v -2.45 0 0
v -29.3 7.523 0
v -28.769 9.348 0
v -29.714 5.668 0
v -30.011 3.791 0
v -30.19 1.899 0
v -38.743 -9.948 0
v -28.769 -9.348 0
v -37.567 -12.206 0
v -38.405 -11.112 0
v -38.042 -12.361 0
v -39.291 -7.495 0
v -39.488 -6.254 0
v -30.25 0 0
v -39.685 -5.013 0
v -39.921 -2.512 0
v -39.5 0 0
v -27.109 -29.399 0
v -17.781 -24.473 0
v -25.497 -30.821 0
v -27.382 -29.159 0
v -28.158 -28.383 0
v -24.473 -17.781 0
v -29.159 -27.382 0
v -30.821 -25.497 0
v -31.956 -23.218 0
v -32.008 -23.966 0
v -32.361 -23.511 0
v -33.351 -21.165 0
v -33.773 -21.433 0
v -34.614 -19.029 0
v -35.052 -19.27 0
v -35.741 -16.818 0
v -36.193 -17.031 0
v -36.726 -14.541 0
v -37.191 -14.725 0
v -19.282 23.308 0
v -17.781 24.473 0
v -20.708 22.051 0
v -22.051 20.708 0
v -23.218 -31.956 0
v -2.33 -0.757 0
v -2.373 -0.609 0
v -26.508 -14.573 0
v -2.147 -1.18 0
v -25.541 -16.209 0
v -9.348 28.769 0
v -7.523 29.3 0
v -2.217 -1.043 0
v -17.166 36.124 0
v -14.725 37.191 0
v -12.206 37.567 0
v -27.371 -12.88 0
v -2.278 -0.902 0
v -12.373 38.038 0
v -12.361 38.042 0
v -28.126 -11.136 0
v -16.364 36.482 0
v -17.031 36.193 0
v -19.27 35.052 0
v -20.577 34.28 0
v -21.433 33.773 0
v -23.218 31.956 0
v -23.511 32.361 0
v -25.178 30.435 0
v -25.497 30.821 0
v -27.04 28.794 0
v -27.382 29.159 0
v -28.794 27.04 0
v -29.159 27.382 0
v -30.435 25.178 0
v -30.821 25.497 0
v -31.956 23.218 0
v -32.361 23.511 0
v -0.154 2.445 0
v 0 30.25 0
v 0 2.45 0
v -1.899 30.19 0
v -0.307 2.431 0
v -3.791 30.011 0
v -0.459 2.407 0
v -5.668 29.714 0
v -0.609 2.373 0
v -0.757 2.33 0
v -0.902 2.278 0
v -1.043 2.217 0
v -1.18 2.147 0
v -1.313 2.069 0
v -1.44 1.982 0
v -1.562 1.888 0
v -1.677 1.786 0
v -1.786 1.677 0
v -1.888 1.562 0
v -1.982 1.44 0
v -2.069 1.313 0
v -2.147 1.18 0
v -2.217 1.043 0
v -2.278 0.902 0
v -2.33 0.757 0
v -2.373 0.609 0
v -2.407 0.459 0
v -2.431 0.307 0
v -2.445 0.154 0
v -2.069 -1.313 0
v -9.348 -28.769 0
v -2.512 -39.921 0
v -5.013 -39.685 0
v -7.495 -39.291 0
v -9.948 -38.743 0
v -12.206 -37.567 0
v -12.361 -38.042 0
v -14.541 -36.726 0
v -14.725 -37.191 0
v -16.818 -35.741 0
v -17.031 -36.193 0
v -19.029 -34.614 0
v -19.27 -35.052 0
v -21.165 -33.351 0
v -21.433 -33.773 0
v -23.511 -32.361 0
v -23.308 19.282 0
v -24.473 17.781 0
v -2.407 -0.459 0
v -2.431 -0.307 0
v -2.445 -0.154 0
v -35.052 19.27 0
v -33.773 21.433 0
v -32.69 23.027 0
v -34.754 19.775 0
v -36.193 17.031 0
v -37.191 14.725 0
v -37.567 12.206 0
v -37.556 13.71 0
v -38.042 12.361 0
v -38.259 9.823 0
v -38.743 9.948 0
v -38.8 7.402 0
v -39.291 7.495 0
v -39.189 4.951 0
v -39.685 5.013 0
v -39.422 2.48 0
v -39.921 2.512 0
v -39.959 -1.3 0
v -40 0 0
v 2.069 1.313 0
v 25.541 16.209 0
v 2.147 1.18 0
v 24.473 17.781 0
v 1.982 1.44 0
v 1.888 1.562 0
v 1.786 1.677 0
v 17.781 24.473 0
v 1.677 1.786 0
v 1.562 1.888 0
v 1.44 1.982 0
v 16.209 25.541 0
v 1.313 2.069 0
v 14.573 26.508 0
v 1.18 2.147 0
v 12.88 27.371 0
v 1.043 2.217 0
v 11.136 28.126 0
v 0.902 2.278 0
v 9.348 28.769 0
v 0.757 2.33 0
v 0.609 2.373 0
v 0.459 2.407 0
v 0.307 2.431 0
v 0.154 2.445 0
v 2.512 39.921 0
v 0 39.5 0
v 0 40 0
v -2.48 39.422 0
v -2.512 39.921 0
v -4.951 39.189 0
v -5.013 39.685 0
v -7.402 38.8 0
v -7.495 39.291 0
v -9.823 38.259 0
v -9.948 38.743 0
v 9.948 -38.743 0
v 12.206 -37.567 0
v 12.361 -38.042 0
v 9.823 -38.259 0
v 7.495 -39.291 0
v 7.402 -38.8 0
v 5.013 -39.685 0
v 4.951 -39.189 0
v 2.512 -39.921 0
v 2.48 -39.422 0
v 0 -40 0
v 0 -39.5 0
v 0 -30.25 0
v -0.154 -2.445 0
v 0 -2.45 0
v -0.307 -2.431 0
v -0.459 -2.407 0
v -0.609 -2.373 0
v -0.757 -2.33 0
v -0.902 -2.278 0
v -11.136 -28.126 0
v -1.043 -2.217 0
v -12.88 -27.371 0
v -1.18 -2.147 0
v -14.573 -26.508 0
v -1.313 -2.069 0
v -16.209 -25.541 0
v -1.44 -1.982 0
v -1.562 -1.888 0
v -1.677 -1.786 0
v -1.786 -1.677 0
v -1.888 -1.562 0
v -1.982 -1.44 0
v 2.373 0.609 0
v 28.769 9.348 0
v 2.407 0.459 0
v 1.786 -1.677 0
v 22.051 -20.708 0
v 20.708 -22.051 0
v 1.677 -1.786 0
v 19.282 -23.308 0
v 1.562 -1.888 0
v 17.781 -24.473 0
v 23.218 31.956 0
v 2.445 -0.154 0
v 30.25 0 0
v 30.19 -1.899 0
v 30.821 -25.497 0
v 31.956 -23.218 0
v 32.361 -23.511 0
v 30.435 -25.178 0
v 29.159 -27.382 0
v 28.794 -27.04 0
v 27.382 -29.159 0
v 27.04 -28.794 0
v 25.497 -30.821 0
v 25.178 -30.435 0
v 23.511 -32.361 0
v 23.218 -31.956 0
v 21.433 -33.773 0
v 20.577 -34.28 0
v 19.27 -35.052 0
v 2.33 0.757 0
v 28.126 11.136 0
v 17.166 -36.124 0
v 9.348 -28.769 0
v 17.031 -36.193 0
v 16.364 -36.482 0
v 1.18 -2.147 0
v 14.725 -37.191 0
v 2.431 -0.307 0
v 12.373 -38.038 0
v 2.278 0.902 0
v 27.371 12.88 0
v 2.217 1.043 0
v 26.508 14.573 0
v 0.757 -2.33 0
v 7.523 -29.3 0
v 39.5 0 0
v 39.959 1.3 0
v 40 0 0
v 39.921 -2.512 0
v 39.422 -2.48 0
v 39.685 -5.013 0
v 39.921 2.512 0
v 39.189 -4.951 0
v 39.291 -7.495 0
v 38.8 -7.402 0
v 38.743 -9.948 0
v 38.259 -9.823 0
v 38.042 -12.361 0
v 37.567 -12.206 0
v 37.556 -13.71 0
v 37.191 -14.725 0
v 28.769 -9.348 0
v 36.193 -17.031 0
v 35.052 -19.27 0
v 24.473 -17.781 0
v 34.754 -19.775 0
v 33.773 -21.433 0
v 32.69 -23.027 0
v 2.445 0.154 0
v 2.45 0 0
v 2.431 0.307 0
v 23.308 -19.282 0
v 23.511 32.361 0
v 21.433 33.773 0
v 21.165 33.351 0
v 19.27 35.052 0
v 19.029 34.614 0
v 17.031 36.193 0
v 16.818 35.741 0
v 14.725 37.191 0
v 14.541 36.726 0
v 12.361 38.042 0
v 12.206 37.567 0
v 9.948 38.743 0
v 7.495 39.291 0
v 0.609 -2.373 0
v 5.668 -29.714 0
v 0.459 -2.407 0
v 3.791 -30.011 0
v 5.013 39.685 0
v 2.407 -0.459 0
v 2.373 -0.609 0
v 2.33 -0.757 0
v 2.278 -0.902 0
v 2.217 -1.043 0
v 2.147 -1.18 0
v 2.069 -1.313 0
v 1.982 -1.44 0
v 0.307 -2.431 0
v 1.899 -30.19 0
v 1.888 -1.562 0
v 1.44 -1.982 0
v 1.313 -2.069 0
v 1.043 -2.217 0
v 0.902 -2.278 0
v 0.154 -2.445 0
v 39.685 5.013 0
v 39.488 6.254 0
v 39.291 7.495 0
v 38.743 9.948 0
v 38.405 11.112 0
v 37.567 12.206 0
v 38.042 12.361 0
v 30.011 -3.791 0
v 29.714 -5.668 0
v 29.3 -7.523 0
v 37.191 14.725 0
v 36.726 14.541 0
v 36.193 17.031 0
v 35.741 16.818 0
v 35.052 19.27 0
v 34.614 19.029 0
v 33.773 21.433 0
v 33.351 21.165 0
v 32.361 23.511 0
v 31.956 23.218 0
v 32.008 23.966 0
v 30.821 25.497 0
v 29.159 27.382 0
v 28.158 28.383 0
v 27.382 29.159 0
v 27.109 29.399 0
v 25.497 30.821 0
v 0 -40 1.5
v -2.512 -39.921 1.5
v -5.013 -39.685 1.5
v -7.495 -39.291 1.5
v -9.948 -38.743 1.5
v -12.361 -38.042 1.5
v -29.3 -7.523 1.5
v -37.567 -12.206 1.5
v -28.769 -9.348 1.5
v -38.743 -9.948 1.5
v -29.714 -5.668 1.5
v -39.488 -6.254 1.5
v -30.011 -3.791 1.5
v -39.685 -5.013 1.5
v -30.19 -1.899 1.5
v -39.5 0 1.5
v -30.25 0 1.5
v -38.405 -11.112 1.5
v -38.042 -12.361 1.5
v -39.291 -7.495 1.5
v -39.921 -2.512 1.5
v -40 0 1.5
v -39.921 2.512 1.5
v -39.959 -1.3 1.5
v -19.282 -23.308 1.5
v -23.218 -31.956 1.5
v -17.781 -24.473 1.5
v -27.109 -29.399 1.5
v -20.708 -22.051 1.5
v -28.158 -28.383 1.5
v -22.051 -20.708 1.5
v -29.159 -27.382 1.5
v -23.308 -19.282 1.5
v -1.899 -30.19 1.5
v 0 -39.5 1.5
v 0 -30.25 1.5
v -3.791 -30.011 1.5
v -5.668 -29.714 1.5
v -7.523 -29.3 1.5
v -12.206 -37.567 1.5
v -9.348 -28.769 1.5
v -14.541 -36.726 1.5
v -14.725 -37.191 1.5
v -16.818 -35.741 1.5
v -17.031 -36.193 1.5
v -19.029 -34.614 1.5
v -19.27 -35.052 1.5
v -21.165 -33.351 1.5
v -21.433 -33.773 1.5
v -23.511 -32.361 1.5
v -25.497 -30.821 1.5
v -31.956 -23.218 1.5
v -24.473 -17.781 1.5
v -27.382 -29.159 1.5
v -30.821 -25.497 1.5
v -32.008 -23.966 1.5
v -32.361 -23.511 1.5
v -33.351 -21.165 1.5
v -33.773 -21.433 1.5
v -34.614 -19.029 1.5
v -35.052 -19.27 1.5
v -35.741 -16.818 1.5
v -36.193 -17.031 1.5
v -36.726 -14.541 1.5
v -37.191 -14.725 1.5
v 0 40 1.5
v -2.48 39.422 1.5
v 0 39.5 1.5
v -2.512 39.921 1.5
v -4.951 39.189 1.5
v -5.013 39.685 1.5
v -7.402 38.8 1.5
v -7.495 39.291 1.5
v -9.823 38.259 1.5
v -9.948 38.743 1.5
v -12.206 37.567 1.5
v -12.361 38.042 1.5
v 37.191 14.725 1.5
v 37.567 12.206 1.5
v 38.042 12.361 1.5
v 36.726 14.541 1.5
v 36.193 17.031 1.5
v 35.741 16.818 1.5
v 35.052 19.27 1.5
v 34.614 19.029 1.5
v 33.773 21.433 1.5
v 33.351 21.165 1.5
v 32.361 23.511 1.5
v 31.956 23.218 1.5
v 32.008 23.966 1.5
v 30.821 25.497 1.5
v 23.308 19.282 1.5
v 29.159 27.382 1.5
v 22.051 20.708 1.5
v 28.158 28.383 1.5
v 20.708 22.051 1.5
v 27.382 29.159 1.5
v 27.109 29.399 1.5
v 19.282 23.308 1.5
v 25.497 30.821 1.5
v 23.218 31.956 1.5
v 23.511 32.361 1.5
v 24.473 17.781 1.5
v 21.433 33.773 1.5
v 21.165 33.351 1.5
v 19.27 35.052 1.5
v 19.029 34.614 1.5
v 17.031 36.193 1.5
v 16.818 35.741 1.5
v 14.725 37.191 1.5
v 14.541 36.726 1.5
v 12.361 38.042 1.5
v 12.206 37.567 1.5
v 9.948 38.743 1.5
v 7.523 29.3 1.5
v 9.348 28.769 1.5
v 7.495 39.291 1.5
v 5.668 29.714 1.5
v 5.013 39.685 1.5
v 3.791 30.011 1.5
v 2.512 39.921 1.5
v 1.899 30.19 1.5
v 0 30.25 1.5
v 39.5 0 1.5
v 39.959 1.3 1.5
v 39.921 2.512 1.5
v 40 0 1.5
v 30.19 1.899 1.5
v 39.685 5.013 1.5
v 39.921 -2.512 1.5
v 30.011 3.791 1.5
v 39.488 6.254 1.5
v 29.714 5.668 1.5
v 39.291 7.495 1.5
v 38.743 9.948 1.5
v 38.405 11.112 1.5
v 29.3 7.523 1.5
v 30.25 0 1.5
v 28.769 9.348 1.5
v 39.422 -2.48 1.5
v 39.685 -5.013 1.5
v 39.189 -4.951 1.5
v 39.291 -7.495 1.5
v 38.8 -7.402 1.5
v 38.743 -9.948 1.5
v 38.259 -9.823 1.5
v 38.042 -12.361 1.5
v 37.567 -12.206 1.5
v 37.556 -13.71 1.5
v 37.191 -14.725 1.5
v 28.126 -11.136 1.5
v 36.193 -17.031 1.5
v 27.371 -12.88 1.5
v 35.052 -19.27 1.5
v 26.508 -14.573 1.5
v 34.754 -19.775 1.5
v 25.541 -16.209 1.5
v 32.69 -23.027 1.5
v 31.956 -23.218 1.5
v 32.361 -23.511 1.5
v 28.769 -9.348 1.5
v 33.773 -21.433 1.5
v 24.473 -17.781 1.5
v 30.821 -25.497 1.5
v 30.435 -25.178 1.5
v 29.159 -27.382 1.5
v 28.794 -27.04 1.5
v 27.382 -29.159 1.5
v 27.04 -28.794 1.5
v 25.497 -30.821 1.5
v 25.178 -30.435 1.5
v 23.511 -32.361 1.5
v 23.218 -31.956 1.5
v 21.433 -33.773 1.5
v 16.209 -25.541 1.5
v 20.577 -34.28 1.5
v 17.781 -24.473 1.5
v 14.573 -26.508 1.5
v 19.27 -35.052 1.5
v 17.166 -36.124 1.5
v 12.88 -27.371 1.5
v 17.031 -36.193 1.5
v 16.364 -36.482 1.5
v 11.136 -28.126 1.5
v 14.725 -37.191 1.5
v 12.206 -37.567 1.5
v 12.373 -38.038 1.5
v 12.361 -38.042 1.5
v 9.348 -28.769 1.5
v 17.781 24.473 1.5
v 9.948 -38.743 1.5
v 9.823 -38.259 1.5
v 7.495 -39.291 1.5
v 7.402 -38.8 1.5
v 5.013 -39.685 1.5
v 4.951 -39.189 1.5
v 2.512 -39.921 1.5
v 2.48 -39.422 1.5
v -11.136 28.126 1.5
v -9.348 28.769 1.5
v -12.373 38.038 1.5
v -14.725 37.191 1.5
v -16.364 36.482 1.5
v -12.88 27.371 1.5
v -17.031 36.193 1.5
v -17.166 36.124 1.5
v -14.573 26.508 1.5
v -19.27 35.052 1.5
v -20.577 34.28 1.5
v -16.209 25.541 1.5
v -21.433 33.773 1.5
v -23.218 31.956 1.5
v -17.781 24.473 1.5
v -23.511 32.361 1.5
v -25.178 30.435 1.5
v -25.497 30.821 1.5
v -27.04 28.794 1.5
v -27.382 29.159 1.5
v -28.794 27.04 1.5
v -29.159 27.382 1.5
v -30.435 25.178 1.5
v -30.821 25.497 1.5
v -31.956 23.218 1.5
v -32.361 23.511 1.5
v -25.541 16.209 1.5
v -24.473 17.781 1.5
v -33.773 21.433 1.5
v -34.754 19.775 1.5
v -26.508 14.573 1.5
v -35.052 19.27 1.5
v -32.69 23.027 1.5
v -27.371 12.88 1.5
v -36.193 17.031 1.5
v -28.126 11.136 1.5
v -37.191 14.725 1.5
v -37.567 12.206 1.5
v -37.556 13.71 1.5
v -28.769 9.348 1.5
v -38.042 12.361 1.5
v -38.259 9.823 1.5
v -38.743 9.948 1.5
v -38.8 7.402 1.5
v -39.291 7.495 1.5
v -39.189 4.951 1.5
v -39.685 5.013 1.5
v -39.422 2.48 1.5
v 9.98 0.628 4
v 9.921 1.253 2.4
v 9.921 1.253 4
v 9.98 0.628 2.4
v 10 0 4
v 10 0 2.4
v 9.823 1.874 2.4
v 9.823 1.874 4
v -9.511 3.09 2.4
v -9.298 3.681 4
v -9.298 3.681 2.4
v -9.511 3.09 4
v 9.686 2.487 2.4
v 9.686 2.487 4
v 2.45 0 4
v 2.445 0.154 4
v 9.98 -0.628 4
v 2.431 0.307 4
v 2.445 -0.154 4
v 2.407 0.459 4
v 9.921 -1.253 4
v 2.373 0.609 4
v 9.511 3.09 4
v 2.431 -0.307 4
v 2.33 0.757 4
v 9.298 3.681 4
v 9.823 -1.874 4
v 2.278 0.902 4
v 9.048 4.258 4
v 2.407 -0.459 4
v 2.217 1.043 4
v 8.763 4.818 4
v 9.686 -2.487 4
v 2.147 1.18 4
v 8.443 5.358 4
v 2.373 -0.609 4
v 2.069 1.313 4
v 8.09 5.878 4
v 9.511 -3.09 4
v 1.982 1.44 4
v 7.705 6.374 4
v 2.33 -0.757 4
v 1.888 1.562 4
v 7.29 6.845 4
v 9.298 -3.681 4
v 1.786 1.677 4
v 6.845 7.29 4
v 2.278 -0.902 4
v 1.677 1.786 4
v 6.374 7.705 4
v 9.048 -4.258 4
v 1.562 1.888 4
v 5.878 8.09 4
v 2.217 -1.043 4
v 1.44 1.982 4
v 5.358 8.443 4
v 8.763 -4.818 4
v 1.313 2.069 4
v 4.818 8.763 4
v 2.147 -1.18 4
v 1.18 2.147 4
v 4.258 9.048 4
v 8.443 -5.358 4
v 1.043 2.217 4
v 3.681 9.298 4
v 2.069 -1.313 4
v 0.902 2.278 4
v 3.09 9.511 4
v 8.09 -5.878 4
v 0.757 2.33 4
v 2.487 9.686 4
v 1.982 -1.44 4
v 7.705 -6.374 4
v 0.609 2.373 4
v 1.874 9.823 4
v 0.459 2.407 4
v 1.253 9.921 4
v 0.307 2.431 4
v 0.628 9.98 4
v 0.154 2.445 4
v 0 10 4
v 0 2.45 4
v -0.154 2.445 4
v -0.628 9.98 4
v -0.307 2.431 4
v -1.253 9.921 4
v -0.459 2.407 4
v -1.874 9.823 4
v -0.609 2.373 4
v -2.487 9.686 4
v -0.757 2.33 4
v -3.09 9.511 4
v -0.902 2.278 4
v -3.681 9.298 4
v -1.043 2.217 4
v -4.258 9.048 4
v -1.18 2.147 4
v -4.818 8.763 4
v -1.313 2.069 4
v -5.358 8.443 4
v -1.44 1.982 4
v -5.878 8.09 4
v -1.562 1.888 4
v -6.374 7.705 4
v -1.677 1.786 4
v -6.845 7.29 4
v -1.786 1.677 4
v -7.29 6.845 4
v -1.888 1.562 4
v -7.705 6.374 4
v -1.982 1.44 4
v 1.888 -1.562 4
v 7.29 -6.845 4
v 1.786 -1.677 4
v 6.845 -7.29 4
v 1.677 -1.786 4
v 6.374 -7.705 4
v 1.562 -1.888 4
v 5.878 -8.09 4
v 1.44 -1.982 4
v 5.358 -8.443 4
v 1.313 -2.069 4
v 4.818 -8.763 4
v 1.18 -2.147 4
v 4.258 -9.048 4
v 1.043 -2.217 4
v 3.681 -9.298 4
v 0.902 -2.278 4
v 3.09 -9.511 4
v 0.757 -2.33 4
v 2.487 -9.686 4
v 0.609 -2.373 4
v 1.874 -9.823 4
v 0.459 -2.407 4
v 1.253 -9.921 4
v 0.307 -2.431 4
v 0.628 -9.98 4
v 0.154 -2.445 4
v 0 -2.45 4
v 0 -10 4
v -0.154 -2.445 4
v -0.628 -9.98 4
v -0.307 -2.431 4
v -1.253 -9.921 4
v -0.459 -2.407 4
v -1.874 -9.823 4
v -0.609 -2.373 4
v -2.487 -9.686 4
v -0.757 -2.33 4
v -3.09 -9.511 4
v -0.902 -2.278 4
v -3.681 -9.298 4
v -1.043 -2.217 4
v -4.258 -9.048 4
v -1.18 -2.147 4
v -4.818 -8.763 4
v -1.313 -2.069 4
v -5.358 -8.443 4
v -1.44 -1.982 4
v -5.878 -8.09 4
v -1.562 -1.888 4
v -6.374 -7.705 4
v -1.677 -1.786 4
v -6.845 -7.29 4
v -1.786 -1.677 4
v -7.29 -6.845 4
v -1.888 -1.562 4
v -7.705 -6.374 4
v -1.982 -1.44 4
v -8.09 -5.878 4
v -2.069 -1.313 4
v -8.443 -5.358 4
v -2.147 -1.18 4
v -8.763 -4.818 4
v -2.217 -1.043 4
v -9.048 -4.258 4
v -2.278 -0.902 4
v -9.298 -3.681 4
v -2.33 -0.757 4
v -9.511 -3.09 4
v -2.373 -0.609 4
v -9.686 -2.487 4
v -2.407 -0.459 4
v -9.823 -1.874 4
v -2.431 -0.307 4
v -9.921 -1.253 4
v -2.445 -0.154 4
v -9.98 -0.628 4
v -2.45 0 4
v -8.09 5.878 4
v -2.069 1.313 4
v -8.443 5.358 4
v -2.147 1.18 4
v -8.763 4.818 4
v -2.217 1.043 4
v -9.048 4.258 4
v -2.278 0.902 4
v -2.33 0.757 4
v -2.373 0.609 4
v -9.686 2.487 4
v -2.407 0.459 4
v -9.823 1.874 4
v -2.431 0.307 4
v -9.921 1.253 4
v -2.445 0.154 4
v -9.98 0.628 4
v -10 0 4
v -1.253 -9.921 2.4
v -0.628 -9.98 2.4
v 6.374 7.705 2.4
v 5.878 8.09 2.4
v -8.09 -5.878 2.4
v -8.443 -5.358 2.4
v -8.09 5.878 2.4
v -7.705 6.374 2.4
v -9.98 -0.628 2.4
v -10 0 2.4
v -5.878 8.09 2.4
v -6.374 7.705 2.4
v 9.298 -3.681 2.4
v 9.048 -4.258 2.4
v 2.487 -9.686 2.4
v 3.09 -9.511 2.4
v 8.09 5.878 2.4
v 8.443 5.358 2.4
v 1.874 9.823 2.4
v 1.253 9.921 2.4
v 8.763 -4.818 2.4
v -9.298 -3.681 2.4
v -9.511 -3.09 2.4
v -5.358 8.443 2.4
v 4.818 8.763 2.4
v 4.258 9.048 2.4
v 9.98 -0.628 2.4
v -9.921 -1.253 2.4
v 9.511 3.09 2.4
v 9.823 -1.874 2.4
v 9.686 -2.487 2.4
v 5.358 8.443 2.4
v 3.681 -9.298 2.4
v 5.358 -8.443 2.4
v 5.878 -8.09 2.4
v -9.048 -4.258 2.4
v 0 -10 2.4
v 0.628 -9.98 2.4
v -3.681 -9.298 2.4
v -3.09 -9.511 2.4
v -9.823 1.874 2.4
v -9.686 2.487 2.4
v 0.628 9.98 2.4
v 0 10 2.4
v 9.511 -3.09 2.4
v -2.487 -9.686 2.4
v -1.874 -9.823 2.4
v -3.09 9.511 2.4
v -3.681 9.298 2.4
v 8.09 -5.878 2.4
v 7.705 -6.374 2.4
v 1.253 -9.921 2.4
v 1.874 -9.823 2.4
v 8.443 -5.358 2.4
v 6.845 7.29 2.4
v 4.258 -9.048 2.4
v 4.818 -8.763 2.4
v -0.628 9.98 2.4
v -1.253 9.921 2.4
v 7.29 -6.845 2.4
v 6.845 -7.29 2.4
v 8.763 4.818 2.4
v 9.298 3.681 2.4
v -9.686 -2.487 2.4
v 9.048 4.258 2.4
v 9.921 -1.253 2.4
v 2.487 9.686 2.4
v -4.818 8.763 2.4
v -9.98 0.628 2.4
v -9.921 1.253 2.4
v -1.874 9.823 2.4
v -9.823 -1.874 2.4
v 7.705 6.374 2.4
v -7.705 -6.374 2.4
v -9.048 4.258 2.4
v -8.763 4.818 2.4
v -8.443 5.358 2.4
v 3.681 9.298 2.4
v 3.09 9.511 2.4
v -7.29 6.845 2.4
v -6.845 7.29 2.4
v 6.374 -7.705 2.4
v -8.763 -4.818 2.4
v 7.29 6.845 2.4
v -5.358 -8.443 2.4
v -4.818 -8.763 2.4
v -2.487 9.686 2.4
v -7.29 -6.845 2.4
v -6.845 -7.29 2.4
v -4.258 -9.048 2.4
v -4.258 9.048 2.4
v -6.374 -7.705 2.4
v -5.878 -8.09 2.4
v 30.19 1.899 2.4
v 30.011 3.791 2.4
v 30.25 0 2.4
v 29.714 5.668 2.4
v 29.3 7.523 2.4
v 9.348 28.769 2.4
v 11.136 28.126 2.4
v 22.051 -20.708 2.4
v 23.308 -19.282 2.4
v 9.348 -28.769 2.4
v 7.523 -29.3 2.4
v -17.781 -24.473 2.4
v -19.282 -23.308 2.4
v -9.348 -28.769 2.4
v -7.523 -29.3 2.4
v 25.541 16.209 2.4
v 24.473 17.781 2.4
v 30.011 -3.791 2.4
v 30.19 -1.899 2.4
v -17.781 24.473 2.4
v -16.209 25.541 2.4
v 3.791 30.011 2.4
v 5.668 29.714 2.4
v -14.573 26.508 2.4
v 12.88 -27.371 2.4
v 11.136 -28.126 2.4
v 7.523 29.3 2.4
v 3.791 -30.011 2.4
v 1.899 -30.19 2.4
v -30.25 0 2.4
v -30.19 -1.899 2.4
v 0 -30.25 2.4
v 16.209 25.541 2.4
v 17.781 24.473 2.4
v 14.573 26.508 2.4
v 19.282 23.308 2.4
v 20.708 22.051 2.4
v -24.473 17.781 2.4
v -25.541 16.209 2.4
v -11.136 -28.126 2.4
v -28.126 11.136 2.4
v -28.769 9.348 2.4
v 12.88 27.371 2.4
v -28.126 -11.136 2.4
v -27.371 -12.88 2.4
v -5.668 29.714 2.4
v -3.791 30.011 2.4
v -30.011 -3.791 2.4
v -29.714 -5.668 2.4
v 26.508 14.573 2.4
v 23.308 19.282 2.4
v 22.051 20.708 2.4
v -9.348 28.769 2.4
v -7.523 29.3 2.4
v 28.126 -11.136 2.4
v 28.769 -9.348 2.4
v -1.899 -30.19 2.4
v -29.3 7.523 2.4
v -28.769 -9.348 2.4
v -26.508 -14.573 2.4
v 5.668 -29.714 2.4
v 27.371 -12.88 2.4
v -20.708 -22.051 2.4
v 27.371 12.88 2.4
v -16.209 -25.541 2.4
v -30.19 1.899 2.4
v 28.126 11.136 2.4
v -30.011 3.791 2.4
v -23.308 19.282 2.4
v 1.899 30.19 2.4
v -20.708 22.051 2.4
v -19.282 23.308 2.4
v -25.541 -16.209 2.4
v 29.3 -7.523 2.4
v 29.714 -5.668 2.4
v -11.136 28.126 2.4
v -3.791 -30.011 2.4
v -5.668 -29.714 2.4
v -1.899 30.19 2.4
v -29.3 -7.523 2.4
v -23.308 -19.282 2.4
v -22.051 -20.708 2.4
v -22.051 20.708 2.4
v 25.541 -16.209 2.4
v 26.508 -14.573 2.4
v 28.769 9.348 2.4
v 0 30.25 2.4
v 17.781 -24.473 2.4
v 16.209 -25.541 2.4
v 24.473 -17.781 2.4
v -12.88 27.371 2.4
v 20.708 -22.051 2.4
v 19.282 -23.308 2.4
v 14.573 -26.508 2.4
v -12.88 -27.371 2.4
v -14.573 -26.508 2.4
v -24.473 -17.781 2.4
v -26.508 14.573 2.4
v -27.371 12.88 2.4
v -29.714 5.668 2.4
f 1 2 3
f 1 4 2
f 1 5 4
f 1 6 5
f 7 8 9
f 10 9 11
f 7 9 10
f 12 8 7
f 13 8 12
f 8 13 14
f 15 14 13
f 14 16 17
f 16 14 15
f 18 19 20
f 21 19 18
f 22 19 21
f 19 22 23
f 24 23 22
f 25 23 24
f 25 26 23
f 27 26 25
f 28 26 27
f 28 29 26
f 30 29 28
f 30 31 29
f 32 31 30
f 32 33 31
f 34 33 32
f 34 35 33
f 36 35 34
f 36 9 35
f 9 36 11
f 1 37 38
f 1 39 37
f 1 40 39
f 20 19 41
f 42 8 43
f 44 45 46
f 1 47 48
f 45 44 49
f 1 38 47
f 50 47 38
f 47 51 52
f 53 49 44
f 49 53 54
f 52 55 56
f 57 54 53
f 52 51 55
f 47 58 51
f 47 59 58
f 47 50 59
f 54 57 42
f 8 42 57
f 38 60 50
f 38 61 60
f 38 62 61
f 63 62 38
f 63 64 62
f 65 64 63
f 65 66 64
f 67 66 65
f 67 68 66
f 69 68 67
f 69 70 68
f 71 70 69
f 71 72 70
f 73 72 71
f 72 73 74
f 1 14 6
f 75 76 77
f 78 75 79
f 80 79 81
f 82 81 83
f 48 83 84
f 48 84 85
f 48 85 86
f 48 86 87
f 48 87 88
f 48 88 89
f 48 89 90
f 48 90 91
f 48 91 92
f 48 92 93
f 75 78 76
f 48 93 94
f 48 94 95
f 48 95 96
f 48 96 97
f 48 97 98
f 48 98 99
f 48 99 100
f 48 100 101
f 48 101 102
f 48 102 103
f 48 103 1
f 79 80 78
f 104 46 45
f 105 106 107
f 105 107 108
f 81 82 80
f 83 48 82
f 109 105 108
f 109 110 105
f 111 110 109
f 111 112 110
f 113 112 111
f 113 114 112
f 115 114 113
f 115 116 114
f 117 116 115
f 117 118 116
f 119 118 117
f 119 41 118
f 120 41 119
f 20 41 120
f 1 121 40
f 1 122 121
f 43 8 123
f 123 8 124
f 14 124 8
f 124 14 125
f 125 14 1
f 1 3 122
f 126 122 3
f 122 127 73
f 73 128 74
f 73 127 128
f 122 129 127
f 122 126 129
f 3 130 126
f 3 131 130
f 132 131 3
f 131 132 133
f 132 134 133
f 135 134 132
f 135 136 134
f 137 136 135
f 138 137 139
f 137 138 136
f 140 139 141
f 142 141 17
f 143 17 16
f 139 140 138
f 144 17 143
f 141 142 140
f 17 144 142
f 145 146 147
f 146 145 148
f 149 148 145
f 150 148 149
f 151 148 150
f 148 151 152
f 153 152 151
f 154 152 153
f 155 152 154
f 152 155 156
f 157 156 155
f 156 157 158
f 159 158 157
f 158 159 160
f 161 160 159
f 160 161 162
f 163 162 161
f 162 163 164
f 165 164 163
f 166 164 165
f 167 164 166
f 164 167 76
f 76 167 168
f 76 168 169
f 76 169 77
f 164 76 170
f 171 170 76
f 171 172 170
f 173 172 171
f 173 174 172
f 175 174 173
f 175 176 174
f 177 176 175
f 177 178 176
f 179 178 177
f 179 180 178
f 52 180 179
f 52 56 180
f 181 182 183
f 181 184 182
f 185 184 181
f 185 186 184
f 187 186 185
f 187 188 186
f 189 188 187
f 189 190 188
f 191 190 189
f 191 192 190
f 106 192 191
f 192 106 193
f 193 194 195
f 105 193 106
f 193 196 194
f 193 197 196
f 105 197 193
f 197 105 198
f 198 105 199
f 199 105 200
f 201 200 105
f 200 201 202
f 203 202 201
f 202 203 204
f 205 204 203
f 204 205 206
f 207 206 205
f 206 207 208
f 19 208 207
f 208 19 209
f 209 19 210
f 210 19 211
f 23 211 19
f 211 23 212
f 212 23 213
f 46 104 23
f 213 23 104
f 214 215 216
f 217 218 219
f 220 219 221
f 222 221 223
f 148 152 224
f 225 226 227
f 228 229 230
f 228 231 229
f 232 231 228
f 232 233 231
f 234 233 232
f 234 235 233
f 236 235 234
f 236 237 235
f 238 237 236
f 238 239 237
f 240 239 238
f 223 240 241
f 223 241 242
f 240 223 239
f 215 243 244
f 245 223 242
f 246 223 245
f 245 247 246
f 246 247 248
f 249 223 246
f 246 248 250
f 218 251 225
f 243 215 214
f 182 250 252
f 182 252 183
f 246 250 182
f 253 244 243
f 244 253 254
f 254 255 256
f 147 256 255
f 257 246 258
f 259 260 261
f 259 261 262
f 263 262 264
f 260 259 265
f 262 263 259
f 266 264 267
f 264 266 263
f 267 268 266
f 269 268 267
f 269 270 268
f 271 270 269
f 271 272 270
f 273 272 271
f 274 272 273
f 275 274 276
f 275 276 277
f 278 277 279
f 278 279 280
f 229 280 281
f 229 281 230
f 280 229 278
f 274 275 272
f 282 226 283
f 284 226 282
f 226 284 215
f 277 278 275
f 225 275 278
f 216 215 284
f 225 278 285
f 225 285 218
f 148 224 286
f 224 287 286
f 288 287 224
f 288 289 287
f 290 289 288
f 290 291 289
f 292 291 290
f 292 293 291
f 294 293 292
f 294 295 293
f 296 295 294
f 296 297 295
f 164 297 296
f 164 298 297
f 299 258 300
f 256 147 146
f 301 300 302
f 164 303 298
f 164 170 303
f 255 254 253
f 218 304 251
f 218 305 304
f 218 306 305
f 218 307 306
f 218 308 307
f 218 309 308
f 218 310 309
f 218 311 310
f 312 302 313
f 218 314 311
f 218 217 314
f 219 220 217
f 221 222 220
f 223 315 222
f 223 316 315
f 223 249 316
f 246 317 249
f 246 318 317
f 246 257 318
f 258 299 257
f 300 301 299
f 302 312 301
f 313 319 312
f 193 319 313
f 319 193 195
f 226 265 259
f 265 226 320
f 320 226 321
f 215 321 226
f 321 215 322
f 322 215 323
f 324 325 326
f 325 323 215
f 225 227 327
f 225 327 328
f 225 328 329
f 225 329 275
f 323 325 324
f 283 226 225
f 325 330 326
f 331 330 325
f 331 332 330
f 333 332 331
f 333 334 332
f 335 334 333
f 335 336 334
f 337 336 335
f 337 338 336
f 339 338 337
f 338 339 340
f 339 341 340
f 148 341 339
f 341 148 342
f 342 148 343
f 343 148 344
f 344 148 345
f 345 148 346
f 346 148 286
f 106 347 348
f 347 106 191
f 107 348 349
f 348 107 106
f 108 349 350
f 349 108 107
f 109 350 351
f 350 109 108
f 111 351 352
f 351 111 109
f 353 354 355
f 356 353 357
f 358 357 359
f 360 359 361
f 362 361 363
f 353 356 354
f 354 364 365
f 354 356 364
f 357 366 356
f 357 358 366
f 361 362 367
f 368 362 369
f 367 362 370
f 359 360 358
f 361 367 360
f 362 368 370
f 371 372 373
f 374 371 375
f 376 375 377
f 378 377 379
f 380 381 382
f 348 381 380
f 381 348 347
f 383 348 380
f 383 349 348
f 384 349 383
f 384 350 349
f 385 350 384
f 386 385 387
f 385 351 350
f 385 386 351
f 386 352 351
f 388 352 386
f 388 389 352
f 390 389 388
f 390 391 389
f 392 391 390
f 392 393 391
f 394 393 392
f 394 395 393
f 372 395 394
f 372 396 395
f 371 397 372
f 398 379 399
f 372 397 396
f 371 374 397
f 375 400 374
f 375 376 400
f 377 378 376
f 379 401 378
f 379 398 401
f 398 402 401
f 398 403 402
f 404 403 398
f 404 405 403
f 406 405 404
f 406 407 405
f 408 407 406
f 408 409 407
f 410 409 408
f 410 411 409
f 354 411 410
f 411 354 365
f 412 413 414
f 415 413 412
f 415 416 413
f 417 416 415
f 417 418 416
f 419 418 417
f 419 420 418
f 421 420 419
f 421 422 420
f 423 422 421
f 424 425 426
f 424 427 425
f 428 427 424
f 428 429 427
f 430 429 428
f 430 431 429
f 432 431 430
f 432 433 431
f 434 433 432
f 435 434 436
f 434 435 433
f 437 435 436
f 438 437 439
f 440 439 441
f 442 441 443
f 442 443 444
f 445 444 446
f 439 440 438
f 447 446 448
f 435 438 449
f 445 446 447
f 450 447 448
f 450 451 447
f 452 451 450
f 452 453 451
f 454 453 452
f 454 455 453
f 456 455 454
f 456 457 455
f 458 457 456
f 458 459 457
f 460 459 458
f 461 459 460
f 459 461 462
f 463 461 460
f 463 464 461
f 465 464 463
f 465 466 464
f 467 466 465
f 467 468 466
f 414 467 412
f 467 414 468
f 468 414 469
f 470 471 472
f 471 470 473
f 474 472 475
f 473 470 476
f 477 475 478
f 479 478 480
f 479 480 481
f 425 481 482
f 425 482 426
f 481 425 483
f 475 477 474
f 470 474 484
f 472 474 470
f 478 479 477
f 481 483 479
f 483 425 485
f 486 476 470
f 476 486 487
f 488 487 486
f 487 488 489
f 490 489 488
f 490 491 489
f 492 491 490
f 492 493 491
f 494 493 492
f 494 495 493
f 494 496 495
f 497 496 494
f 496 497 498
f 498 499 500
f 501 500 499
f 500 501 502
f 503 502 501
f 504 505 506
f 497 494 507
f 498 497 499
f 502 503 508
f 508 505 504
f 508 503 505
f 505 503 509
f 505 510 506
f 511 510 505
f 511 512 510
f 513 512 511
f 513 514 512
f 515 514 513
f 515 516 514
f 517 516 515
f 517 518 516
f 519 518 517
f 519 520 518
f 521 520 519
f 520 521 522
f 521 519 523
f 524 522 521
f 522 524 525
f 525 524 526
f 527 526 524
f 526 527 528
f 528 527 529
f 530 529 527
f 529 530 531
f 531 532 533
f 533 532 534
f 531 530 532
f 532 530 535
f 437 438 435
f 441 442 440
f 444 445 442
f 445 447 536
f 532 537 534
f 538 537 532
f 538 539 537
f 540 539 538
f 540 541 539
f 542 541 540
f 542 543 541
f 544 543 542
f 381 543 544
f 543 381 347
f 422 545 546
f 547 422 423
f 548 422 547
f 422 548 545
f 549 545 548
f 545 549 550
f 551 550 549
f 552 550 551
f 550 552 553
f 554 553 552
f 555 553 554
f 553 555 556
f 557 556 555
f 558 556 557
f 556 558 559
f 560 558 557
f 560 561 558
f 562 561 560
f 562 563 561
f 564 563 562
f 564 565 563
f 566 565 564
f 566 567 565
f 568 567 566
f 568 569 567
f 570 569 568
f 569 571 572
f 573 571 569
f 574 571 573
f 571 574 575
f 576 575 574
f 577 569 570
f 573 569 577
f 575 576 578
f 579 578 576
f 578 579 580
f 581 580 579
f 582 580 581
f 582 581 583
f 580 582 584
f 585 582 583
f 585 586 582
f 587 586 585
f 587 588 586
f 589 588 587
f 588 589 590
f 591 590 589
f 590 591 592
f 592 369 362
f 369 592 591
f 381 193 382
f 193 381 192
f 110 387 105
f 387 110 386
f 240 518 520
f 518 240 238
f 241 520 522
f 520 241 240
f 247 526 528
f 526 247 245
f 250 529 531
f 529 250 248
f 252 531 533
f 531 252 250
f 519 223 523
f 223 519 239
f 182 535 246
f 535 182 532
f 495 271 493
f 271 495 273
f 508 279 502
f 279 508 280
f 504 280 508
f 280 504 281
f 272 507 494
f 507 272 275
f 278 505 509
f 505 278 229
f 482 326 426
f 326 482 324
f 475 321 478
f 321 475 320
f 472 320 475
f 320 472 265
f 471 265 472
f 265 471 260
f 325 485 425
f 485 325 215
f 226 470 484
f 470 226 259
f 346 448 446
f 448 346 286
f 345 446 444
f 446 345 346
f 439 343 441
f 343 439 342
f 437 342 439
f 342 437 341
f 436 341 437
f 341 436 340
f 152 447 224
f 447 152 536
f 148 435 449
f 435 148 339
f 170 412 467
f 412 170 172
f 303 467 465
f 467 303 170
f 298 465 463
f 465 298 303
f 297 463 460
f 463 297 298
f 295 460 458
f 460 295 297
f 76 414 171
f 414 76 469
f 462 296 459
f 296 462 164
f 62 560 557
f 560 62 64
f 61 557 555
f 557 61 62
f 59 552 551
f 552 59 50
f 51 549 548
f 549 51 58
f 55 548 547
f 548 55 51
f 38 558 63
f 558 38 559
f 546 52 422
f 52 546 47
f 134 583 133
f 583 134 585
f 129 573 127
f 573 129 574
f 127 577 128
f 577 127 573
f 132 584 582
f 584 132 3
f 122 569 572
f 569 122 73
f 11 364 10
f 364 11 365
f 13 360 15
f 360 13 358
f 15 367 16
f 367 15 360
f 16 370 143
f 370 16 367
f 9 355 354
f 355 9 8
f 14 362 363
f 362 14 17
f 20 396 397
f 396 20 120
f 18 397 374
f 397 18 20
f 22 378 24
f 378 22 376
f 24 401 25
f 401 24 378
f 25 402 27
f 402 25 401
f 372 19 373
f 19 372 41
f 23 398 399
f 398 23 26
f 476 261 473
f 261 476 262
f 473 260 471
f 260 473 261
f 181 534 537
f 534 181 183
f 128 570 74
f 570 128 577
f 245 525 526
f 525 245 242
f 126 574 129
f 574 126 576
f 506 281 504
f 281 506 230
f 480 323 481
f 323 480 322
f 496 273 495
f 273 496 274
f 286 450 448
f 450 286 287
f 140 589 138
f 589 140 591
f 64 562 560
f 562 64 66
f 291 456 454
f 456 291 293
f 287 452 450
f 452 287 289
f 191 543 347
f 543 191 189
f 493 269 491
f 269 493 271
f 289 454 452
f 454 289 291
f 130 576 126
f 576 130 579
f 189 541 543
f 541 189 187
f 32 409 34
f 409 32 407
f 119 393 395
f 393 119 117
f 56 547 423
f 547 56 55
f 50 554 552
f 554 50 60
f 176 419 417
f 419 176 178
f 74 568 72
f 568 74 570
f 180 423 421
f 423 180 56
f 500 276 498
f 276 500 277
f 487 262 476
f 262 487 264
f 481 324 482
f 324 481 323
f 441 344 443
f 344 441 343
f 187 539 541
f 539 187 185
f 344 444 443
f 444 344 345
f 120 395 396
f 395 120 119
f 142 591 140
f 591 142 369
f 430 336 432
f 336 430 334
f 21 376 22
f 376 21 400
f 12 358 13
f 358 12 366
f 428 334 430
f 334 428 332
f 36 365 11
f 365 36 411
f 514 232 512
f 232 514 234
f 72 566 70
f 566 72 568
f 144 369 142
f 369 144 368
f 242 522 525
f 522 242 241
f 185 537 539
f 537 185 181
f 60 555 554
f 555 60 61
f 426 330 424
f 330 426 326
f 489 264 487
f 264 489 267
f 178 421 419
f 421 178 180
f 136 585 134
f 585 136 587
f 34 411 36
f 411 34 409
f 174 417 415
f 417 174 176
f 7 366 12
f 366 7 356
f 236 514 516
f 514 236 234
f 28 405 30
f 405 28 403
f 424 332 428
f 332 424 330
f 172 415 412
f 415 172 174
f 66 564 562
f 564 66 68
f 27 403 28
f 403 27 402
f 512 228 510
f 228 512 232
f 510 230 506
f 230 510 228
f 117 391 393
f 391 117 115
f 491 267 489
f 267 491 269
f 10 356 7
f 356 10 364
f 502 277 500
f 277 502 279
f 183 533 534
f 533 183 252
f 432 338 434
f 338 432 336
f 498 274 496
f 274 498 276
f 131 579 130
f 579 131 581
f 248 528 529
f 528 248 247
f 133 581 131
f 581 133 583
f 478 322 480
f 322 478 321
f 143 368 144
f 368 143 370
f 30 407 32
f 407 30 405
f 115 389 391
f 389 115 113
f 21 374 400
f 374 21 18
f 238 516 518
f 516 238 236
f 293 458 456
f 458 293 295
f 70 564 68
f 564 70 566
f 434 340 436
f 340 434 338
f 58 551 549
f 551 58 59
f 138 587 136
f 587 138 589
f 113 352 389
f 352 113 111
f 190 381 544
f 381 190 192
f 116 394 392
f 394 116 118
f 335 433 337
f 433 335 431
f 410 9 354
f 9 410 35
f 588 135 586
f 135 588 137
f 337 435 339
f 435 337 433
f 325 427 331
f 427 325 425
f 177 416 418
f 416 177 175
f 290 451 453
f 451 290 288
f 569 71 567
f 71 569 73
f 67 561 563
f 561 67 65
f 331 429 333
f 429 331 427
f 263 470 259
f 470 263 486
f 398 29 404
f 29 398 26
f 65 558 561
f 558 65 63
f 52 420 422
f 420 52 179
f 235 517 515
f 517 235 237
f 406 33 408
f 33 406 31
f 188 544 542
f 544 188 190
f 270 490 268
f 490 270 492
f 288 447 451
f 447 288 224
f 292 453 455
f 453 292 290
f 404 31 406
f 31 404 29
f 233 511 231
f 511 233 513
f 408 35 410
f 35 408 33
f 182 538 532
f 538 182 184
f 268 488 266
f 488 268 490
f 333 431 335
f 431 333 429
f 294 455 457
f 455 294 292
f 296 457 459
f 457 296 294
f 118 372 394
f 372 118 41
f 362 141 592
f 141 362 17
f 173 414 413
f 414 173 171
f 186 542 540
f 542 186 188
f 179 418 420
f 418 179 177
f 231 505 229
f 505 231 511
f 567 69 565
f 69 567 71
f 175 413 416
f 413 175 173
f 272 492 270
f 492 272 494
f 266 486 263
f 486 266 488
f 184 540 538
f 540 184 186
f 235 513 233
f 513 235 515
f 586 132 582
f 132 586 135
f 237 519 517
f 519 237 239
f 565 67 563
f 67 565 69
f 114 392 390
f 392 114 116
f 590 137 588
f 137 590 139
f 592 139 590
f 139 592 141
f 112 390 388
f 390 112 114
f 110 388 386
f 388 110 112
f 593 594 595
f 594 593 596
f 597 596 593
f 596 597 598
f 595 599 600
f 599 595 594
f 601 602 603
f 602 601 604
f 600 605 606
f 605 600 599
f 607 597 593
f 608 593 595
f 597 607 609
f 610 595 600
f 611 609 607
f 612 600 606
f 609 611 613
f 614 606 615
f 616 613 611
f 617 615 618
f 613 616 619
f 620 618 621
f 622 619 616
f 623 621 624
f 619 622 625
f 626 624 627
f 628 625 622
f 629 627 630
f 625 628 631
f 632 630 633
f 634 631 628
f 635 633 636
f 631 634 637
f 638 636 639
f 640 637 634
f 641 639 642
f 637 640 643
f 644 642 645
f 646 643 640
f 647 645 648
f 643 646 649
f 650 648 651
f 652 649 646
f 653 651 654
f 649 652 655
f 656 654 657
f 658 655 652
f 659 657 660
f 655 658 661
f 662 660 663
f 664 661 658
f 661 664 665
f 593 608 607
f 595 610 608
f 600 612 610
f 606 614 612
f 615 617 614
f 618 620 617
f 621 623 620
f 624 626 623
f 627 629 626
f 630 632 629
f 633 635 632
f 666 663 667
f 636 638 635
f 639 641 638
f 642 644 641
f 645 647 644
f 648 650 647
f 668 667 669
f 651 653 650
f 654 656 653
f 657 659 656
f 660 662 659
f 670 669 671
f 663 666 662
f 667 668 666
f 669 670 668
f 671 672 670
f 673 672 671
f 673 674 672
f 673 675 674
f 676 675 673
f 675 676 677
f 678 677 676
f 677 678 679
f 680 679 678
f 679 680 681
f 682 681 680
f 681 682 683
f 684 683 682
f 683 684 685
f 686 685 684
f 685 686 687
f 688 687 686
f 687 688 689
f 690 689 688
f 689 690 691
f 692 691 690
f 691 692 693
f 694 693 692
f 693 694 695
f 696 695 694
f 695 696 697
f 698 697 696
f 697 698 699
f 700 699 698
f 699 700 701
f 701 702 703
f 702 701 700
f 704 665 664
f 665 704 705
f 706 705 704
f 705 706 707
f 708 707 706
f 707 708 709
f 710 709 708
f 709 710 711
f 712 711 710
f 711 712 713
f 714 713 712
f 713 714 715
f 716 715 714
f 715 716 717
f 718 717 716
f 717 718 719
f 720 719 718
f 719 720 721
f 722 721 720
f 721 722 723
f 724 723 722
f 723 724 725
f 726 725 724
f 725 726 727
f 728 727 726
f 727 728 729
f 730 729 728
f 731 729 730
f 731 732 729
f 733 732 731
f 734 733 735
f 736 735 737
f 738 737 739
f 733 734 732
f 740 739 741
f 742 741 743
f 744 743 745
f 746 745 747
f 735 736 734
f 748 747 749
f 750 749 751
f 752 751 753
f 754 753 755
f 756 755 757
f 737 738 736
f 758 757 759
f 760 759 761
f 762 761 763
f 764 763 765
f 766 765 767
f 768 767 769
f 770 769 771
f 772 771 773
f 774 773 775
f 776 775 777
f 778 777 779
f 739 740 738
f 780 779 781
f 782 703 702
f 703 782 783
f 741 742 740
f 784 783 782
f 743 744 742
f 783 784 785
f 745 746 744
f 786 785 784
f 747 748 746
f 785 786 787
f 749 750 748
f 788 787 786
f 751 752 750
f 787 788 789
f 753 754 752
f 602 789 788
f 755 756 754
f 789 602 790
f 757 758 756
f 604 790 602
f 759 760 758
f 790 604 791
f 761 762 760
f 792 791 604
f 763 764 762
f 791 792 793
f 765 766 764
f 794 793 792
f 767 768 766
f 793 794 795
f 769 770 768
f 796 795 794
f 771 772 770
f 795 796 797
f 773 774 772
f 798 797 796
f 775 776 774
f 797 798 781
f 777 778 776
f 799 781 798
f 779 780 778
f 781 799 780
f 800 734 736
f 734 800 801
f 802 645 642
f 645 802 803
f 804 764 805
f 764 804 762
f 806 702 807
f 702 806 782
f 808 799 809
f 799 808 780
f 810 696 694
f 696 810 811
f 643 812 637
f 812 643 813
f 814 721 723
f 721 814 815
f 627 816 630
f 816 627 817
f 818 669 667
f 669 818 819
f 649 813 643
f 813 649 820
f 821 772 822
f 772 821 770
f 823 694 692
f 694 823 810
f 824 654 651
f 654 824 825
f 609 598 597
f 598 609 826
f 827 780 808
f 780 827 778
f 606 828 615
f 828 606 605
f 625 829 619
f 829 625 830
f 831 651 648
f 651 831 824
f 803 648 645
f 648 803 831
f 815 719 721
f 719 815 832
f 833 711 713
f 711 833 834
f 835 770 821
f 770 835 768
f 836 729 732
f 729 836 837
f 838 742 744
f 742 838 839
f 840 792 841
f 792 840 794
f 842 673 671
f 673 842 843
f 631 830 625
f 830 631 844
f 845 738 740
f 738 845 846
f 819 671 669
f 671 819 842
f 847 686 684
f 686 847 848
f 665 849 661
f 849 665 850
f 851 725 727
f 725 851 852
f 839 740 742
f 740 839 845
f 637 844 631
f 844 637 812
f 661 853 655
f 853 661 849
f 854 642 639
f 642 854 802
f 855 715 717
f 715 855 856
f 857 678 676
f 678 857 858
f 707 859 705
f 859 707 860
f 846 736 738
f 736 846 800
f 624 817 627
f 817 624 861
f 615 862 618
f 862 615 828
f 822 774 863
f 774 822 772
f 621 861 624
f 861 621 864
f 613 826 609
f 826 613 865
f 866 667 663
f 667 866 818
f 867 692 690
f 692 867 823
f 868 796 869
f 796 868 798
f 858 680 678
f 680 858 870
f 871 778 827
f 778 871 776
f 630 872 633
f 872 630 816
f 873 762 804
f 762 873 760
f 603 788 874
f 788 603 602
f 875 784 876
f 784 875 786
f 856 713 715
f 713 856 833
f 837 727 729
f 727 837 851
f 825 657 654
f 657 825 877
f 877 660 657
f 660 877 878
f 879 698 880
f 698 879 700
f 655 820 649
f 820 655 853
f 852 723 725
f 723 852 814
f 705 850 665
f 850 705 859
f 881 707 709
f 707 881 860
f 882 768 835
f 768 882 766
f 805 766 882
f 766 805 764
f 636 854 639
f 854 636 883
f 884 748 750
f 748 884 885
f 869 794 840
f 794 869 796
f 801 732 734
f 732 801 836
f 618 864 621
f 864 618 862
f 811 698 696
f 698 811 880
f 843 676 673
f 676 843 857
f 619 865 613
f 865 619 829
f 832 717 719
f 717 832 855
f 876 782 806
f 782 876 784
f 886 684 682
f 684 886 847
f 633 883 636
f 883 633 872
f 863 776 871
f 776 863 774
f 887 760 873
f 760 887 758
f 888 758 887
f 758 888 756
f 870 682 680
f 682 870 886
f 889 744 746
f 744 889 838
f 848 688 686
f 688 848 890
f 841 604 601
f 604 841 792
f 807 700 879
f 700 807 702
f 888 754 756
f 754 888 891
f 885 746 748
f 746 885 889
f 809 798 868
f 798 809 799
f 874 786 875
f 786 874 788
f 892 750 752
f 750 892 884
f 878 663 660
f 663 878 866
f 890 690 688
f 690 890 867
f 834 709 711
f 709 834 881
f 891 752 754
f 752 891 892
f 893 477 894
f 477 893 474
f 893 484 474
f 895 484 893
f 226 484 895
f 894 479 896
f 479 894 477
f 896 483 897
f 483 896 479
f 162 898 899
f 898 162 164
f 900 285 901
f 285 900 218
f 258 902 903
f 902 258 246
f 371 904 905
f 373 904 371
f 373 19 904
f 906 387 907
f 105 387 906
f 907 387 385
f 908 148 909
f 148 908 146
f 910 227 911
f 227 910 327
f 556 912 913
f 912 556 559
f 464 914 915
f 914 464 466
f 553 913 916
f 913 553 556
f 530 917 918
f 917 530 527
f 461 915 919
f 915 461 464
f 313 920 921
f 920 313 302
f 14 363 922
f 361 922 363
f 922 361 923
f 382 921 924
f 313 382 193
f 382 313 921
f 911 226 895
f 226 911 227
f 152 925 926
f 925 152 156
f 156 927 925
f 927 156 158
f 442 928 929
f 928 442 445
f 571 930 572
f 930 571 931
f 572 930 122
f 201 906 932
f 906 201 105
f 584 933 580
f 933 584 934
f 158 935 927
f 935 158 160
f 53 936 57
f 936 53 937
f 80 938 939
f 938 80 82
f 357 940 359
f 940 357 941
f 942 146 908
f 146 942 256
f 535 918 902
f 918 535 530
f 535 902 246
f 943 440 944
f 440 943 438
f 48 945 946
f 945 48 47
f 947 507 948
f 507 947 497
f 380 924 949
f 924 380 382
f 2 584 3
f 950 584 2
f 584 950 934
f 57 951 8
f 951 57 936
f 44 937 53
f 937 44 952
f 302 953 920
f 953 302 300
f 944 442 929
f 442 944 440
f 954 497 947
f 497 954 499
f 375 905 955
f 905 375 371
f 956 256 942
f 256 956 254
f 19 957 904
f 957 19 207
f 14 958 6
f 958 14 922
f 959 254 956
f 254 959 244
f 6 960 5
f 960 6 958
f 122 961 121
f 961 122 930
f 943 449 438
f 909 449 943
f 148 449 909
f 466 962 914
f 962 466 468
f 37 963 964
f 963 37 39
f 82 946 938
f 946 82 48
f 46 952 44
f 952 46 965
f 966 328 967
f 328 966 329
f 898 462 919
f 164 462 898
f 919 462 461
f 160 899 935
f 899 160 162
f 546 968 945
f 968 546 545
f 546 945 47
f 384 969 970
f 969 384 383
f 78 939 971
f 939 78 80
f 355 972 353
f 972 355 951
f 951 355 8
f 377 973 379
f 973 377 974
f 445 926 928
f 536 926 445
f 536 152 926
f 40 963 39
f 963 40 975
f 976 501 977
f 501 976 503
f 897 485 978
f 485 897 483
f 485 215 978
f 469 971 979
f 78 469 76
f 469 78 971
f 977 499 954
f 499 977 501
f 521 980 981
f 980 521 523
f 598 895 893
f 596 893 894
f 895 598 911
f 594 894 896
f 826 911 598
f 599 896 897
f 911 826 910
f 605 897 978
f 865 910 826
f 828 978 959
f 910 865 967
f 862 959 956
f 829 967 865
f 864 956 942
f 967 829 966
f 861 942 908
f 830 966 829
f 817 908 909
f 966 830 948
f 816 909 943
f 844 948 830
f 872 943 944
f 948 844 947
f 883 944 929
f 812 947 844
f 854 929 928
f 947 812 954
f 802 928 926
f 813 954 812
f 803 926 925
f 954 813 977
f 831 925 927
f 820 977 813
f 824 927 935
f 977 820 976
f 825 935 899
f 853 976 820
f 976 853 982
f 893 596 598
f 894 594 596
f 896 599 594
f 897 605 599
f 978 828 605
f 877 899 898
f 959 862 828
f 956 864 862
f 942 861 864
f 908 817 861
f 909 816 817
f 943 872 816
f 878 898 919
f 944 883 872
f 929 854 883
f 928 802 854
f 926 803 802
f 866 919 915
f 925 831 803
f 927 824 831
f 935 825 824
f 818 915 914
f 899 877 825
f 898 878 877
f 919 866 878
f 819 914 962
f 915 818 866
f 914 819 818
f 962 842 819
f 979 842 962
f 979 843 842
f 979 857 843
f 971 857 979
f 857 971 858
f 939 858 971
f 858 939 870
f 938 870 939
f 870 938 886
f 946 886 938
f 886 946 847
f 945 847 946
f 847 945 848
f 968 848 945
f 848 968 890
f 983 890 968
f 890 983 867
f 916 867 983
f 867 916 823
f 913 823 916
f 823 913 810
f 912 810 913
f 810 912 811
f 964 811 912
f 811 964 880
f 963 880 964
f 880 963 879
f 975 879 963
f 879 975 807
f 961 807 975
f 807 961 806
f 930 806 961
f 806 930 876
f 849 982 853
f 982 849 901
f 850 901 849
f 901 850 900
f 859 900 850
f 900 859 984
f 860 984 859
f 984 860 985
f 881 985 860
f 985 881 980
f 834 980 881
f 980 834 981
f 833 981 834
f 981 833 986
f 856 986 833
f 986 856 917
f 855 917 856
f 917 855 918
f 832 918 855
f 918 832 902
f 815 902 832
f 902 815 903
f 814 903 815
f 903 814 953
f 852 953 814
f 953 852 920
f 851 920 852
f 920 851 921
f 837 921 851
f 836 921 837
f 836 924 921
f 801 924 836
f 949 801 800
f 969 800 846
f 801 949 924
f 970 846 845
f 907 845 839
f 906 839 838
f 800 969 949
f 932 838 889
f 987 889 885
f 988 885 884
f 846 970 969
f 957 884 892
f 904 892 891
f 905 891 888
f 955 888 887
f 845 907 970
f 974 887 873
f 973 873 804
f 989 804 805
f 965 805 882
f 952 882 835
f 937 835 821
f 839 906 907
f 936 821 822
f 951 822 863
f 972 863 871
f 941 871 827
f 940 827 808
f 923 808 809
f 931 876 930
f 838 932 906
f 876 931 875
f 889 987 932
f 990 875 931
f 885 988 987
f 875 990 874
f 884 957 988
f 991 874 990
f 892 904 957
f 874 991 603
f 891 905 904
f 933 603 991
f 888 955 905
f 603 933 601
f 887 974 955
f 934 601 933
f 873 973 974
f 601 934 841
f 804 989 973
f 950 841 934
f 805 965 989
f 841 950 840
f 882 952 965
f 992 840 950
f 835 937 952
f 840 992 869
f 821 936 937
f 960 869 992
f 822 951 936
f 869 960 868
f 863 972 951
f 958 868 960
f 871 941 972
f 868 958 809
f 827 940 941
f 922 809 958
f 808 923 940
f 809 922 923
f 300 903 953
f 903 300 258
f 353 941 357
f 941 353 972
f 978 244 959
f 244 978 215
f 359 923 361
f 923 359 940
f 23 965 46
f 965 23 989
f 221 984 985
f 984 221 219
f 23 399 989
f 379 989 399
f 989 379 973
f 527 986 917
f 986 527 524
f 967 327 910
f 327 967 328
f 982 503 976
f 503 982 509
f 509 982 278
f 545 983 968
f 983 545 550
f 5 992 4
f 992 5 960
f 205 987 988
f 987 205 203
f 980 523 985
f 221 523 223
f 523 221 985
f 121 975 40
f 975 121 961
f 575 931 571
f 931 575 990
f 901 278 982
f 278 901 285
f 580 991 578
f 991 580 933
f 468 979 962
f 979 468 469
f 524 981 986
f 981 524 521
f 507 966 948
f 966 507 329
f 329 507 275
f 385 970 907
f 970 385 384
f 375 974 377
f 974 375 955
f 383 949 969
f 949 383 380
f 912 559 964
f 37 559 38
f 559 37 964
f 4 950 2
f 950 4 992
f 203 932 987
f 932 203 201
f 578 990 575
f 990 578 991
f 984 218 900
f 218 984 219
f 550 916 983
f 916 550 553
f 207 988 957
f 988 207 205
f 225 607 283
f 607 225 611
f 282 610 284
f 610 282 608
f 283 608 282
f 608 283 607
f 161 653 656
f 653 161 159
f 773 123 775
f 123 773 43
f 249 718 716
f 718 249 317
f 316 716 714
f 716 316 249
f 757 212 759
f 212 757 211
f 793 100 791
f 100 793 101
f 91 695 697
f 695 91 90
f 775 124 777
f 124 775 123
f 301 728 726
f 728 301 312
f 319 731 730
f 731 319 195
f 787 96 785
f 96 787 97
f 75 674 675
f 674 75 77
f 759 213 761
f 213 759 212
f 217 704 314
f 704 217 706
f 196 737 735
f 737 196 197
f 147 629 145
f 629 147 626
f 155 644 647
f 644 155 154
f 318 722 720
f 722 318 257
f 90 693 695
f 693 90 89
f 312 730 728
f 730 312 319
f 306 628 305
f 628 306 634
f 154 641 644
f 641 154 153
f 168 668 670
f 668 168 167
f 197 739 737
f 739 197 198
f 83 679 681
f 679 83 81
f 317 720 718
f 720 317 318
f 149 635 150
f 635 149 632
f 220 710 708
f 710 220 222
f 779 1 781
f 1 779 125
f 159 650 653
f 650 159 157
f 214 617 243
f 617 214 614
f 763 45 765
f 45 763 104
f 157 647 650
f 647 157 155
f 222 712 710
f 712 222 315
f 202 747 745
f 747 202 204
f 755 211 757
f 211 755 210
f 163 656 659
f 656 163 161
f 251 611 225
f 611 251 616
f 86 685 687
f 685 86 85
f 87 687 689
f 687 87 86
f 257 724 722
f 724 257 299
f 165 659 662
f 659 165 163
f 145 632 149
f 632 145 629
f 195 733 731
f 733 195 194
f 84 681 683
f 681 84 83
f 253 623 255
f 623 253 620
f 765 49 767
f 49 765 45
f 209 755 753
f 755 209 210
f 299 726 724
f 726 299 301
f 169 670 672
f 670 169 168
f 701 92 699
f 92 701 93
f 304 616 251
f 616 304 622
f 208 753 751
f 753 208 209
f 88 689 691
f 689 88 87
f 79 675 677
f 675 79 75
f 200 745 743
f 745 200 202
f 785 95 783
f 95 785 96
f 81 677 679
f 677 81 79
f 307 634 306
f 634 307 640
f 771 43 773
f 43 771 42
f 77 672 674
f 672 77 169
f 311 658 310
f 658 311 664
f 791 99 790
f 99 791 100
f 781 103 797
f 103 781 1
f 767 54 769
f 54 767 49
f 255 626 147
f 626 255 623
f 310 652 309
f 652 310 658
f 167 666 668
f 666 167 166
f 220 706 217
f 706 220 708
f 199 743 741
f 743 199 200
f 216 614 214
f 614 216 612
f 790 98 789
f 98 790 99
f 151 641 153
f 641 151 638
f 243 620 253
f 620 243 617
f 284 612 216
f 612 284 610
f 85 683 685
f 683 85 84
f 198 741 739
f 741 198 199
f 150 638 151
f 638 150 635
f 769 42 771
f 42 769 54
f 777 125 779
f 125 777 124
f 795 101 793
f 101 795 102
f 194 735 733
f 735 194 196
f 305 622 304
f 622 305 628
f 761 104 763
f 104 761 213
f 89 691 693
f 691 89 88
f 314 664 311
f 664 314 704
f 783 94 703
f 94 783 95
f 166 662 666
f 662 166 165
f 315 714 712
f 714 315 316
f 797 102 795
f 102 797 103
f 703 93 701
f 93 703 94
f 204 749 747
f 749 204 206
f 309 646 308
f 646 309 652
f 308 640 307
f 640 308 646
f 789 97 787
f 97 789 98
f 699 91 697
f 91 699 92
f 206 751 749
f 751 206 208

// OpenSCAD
/* Code wheel for test stand
 * Date: 20170208
 * codewheel_2
 */
 
 dia_center_hole = (4.9); // Center mounting hole
 thick_center_hole = (4.0); // Thickness at center hole
 dia_magtop = (20.0);  // Diameter flat of magnet top

 dia_taper = (30); // Diameter where taper ends
 nsegs = 6;  // Number of segments
 
 thick_1st_step = (2.4); // 
 dia_1st_step = (60.5);
 
 thick_seg = (1.5);   // Thickness at segments
 dia_seg = (50);    // Outer dia of segments
 dia_overall = (dia_seg + 3);
 thick_rim = (thick_seg + 1); // Rim slightly thicker
 
 timingHoles = 10;
 encoderDiameter = 40;
 
 outer_rim_dia = 80;  
 thick_outer_rim = thick_seg;
 width_outer_rim = 1;
 
 quant = 100;
 $fn = quant; // Quantization

module center_hole()
{
    cylinder(h = thick_center_hole, d = dia_center_hole, center = false);
}

module center_post()
{
    cylinder(h = thick_center_hole, d = dia_magtop, center = false);
}

module first_step()
{ 
        cylinder(h = thick_1st_step, d = dia_1st_step, center = false);
}

module segs()
{
    cylinder(h = thick_seg, d = dia_seg, center = false);
}

module outer_rim()
{   
    render()
    {
    difference() {
        cylinder(h = thick_outer_rim, d = outer_rim_dia, center = false);
        cylinder(h = thick_outer_rim, d = outer_rim_dia - width_outer_rim, center = false);
    }
}
}

module arc( height, depth, radius, degrees ) {
	// This dies a horible death if it's not rendered here 
	// -- sucks up all memory and spins out of control 
	render() {
		difference() {
			// Outer ring
			rotate_extrude($fn = quant)
				translate([radius - height, 0, 0])
					square([height,depth]);
		
			// Cut half off
			translate([0,-(radius+1),-.5]) 
				cube ([radius+1,(radius+1)*2,depth+1]);
		
			// Cover the other half as necessary
			rotate([0,0,180-degrees])
			translate([0,-(radius+1),-.5]) 
				cube ([radius+1,(radius+1)*2,depth+1]);	
		}
	}
}

	// Punch out timing holes	
//D_arc(w=thickness_of_arc, r=radius_of_arc, deg=degrees_of_arc_angle, fn=resolution, h=height_of_arc);

module timing_holes()
{
        for ( i = [0 : timingHoles-1] ) {
            rotate( i*(360/timingHoles), [0, 0, 1])
			arc( 10,  /* Height */
			thick_seg, /* Depth */
			encoderDiameter, /* Radius */
			degrees =180/timingHoles); /* Degrees */
	}
}            
            
module main()
{
    difference()
    {
        union()
        {
            center_post();
            first_step();
            segs();
            timing_holes();
            outer_rim();
        }
           center_hole();
        
        
    }
    
}
main();
